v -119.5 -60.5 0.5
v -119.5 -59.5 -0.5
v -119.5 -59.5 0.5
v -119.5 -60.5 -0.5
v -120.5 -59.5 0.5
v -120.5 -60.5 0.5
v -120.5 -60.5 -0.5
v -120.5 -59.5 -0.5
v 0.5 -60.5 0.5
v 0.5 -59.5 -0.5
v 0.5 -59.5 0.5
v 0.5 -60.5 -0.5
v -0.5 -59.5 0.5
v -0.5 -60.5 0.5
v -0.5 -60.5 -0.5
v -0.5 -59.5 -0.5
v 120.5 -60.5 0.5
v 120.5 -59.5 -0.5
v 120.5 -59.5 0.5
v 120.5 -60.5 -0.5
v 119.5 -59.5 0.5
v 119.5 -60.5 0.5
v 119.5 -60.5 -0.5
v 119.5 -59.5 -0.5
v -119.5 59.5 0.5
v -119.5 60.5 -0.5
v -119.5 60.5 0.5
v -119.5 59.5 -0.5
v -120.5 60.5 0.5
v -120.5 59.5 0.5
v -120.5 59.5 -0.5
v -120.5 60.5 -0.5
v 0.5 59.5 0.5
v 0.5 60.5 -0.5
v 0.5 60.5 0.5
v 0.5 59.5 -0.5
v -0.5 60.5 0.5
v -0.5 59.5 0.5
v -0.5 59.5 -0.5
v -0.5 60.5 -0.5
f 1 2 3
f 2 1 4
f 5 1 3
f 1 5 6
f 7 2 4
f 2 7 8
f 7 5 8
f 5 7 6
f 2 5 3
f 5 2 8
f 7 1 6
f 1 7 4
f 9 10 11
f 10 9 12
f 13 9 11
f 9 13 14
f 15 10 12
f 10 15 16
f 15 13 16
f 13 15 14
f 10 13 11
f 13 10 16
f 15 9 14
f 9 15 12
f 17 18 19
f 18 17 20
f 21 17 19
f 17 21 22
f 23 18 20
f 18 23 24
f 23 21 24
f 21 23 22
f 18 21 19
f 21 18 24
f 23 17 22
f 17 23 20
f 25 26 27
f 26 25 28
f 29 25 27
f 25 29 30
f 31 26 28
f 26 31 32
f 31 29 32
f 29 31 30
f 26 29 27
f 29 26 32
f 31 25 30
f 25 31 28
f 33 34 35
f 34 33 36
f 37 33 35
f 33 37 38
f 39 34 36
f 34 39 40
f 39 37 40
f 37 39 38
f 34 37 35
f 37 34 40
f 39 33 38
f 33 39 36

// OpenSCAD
// design_20251106_152907 - Generated by Kalki Design Engine
// Generated: 2025-11-06T15:29:07.064139
// Design Type: robotics


// Preview helpers (only rendered in OpenSCAD preview mode)
module preview_axes(axis_len=120) {
    color([1, 0, 0, 0.3]) cube([axis_len, 2, 2], center=true); // X-axis
    color([0, 1, 0, 0.3]) cube([2, axis_len, 2], center=true); // Y-axis
    color([0, 0, 1, 0.3]) cube([2, 2, axis_len], center=true); // Z-axis
}

module preview_origin_marker(size=4) {
    color([1, 0.5, 0, 0.5]) sphere(r=size);
}

// Mechanical component libraries
module servo_motor(length=60, diameter=40, shaft_diameter=6, shaft_length=20) {
    // Motor body
    color([0.3, 0.3, 0.3]) cylinder(h=length, d=diameter, center=true);
    // Mounting flanges
    color([0.4, 0.4, 0.4]) {
        translate([0, 0, length/2 + 2]) cylinder(h=4, d=diameter + 10, center=true);
        translate([0, 0, -length/2 - 2]) cylinder(h=4, d=diameter + 10, center=true);
    }
    // Shaft
    color([0.8, 0.8, 0.8]) translate([0, 0, length/2 + shaft_length/2]) cylinder(h=shaft_length, d=shaft_diameter, center=true);
    // Mounting holes
    for (angle = [0, 90, 180, 270]) {
        rotate([0, 0, angle]) translate([diameter/2 + 5, 0, 0]) cylinder(h=length + 10, d=3, center=true);
    }
}

module bearing(outer_diameter=30, inner_diameter=10, thickness=8) {
    // Outer race
    color([0.6, 0.6, 0.6]) difference() {
        cylinder(h=thickness, d=outer_diameter, center=true);
        cylinder(h=thickness + 2, d=inner_diameter, center=true);
    }
    // Inner race
    color([0.7, 0.7, 0.7]) cylinder(h=thickness - 2, d=inner_diameter + 4, center=true);
    // Balls (simplified)
    color([0.9, 0.9, 0.9]) for (angle = [0:45:315]) {
        rotate([0, 0, angle]) translate([(outer_diameter + inner_diameter)/4, 0, 0]) sphere(r=2);
    }
}

module gear(radius=25, thickness=10, teeth=20) {
    // Gear body
    color([0.4, 0.4, 0.4]) cylinder(h=thickness, d=radius*2, center=true);
    // Teeth (simplified)
    color([0.3, 0.3, 0.3]) for (angle = [0:360/teeth:359]) {
        rotate([0, 0, angle]) translate([radius - 2, 0, 0]) cube([4, 3, thickness], center=true);
    }
    // Center hole
    color([0.2, 0.2, 0.2]) cylinder(h=thickness + 2, d=8, center=true);
}

module harmonic_drive(cup_diameter=60, flex_spline_diameter=50, thickness=15) {
    // Wave generator (simplified)
    color([0.5, 0.5, 0.5]) cylinder(h=thickness, d=cup_diameter * 0.7, center=true);
    // Flex spline
    color([0.6, 0.6, 0.6]) cylinder(h=thickness - 2, d=flex_spline_diameter, center=true);
    // Circular spline
    color([0.4, 0.4, 0.4]) difference() {
        cylinder(h=thickness - 4, d=cup_diameter, center=true);
        cylinder(h=thickness, d=flex_spline_diameter + 5, center=true);
    }
}

module robotic_link(length=200, diameter=40, wall_thickness=3) {
    // Hollow cylindrical link
    color([0.8, 0.8, 0.9]) difference() {
        cylinder(h=length, d=diameter, center=true);
        cylinder(h=length + 2, d=diameter - wall_thickness*2, center=true);
    }
    // End flanges
    color([0.7, 0.7, 0.8]) {
        translate([0, 0, length/2]) cylinder(h=6, d=diameter + 10, center=true);
        translate([0, 0, -length/2]) cylinder(h=6, d=diameter + 10, center=true);
    }
    // Mounting holes
    for (z_pos = [-length/3, 0, length/3]) {
        translate([0, 0, z_pos]) for (angle = [0, 90, 180, 270]) {
            rotate([0, 0, angle]) translate([diameter/2 + 5, 0, 0]) cylinder(h=8, d=4, center=true);
        }
    }
}

module end_effector(gripper_width=80, gripper_length=60, finger_length=40) {
    // Base
    color([0.3, 0.3, 0.3]) cube([gripper_width, gripper_length, 20], center=true);
    // Fingers
    color([0.5, 0.5, 0.5]) {
        translate([-gripper_width/4, gripper_length/2 + finger_length/2, 10]) cube([8, finger_length, 4], center=true);
        translate([gripper_width/4, gripper_length/2 + finger_length/2, 10]) cube([8, finger_length, 4], center=true);
    }
    // Actuator
    translate([0, -gripper_length/4, 15]) servo_motor(30, 25, 4, 10);
}

// Component 1: chassis
module component_0() {
    // Type: Provides chassis functionality
    cube([1.0, 1.0, 1.0], center=true);
}

// Component 2: actuators
module component_1() {
    // Type: Provides actuators functionality
    cube([1.0, 1.0, 1.0], center=true);
}

// Component 3: sensors
module component_2() {
    // Type: Provides sensors functionality
    cube([1.0, 1.0, 1.0], center=true);
}

// Component 4: controller
module component_3() {
    // Type: Provides controller functionality
    cube([1.0, 1.0, 1.0], center=true);
}

// Component 5: power
module component_4() {
    // Type: Provides power functionality
    cube([1.0, 1.0, 1.0], center=true);
}

// Assembly
translate([-120.00, -60.00, 0]) component_0();
translate([0.00, -60.00, 0]) component_1();
translate([120.00, -60.00, 0]) component_2();
translate([-120.00, 60.00, 0]) component_3();
translate([0.00, 60.00, 0]) component_4();


if ($preview) {
    preview_axes(axis_len=360.00);
    preview_origin_marker(size=6);
}
